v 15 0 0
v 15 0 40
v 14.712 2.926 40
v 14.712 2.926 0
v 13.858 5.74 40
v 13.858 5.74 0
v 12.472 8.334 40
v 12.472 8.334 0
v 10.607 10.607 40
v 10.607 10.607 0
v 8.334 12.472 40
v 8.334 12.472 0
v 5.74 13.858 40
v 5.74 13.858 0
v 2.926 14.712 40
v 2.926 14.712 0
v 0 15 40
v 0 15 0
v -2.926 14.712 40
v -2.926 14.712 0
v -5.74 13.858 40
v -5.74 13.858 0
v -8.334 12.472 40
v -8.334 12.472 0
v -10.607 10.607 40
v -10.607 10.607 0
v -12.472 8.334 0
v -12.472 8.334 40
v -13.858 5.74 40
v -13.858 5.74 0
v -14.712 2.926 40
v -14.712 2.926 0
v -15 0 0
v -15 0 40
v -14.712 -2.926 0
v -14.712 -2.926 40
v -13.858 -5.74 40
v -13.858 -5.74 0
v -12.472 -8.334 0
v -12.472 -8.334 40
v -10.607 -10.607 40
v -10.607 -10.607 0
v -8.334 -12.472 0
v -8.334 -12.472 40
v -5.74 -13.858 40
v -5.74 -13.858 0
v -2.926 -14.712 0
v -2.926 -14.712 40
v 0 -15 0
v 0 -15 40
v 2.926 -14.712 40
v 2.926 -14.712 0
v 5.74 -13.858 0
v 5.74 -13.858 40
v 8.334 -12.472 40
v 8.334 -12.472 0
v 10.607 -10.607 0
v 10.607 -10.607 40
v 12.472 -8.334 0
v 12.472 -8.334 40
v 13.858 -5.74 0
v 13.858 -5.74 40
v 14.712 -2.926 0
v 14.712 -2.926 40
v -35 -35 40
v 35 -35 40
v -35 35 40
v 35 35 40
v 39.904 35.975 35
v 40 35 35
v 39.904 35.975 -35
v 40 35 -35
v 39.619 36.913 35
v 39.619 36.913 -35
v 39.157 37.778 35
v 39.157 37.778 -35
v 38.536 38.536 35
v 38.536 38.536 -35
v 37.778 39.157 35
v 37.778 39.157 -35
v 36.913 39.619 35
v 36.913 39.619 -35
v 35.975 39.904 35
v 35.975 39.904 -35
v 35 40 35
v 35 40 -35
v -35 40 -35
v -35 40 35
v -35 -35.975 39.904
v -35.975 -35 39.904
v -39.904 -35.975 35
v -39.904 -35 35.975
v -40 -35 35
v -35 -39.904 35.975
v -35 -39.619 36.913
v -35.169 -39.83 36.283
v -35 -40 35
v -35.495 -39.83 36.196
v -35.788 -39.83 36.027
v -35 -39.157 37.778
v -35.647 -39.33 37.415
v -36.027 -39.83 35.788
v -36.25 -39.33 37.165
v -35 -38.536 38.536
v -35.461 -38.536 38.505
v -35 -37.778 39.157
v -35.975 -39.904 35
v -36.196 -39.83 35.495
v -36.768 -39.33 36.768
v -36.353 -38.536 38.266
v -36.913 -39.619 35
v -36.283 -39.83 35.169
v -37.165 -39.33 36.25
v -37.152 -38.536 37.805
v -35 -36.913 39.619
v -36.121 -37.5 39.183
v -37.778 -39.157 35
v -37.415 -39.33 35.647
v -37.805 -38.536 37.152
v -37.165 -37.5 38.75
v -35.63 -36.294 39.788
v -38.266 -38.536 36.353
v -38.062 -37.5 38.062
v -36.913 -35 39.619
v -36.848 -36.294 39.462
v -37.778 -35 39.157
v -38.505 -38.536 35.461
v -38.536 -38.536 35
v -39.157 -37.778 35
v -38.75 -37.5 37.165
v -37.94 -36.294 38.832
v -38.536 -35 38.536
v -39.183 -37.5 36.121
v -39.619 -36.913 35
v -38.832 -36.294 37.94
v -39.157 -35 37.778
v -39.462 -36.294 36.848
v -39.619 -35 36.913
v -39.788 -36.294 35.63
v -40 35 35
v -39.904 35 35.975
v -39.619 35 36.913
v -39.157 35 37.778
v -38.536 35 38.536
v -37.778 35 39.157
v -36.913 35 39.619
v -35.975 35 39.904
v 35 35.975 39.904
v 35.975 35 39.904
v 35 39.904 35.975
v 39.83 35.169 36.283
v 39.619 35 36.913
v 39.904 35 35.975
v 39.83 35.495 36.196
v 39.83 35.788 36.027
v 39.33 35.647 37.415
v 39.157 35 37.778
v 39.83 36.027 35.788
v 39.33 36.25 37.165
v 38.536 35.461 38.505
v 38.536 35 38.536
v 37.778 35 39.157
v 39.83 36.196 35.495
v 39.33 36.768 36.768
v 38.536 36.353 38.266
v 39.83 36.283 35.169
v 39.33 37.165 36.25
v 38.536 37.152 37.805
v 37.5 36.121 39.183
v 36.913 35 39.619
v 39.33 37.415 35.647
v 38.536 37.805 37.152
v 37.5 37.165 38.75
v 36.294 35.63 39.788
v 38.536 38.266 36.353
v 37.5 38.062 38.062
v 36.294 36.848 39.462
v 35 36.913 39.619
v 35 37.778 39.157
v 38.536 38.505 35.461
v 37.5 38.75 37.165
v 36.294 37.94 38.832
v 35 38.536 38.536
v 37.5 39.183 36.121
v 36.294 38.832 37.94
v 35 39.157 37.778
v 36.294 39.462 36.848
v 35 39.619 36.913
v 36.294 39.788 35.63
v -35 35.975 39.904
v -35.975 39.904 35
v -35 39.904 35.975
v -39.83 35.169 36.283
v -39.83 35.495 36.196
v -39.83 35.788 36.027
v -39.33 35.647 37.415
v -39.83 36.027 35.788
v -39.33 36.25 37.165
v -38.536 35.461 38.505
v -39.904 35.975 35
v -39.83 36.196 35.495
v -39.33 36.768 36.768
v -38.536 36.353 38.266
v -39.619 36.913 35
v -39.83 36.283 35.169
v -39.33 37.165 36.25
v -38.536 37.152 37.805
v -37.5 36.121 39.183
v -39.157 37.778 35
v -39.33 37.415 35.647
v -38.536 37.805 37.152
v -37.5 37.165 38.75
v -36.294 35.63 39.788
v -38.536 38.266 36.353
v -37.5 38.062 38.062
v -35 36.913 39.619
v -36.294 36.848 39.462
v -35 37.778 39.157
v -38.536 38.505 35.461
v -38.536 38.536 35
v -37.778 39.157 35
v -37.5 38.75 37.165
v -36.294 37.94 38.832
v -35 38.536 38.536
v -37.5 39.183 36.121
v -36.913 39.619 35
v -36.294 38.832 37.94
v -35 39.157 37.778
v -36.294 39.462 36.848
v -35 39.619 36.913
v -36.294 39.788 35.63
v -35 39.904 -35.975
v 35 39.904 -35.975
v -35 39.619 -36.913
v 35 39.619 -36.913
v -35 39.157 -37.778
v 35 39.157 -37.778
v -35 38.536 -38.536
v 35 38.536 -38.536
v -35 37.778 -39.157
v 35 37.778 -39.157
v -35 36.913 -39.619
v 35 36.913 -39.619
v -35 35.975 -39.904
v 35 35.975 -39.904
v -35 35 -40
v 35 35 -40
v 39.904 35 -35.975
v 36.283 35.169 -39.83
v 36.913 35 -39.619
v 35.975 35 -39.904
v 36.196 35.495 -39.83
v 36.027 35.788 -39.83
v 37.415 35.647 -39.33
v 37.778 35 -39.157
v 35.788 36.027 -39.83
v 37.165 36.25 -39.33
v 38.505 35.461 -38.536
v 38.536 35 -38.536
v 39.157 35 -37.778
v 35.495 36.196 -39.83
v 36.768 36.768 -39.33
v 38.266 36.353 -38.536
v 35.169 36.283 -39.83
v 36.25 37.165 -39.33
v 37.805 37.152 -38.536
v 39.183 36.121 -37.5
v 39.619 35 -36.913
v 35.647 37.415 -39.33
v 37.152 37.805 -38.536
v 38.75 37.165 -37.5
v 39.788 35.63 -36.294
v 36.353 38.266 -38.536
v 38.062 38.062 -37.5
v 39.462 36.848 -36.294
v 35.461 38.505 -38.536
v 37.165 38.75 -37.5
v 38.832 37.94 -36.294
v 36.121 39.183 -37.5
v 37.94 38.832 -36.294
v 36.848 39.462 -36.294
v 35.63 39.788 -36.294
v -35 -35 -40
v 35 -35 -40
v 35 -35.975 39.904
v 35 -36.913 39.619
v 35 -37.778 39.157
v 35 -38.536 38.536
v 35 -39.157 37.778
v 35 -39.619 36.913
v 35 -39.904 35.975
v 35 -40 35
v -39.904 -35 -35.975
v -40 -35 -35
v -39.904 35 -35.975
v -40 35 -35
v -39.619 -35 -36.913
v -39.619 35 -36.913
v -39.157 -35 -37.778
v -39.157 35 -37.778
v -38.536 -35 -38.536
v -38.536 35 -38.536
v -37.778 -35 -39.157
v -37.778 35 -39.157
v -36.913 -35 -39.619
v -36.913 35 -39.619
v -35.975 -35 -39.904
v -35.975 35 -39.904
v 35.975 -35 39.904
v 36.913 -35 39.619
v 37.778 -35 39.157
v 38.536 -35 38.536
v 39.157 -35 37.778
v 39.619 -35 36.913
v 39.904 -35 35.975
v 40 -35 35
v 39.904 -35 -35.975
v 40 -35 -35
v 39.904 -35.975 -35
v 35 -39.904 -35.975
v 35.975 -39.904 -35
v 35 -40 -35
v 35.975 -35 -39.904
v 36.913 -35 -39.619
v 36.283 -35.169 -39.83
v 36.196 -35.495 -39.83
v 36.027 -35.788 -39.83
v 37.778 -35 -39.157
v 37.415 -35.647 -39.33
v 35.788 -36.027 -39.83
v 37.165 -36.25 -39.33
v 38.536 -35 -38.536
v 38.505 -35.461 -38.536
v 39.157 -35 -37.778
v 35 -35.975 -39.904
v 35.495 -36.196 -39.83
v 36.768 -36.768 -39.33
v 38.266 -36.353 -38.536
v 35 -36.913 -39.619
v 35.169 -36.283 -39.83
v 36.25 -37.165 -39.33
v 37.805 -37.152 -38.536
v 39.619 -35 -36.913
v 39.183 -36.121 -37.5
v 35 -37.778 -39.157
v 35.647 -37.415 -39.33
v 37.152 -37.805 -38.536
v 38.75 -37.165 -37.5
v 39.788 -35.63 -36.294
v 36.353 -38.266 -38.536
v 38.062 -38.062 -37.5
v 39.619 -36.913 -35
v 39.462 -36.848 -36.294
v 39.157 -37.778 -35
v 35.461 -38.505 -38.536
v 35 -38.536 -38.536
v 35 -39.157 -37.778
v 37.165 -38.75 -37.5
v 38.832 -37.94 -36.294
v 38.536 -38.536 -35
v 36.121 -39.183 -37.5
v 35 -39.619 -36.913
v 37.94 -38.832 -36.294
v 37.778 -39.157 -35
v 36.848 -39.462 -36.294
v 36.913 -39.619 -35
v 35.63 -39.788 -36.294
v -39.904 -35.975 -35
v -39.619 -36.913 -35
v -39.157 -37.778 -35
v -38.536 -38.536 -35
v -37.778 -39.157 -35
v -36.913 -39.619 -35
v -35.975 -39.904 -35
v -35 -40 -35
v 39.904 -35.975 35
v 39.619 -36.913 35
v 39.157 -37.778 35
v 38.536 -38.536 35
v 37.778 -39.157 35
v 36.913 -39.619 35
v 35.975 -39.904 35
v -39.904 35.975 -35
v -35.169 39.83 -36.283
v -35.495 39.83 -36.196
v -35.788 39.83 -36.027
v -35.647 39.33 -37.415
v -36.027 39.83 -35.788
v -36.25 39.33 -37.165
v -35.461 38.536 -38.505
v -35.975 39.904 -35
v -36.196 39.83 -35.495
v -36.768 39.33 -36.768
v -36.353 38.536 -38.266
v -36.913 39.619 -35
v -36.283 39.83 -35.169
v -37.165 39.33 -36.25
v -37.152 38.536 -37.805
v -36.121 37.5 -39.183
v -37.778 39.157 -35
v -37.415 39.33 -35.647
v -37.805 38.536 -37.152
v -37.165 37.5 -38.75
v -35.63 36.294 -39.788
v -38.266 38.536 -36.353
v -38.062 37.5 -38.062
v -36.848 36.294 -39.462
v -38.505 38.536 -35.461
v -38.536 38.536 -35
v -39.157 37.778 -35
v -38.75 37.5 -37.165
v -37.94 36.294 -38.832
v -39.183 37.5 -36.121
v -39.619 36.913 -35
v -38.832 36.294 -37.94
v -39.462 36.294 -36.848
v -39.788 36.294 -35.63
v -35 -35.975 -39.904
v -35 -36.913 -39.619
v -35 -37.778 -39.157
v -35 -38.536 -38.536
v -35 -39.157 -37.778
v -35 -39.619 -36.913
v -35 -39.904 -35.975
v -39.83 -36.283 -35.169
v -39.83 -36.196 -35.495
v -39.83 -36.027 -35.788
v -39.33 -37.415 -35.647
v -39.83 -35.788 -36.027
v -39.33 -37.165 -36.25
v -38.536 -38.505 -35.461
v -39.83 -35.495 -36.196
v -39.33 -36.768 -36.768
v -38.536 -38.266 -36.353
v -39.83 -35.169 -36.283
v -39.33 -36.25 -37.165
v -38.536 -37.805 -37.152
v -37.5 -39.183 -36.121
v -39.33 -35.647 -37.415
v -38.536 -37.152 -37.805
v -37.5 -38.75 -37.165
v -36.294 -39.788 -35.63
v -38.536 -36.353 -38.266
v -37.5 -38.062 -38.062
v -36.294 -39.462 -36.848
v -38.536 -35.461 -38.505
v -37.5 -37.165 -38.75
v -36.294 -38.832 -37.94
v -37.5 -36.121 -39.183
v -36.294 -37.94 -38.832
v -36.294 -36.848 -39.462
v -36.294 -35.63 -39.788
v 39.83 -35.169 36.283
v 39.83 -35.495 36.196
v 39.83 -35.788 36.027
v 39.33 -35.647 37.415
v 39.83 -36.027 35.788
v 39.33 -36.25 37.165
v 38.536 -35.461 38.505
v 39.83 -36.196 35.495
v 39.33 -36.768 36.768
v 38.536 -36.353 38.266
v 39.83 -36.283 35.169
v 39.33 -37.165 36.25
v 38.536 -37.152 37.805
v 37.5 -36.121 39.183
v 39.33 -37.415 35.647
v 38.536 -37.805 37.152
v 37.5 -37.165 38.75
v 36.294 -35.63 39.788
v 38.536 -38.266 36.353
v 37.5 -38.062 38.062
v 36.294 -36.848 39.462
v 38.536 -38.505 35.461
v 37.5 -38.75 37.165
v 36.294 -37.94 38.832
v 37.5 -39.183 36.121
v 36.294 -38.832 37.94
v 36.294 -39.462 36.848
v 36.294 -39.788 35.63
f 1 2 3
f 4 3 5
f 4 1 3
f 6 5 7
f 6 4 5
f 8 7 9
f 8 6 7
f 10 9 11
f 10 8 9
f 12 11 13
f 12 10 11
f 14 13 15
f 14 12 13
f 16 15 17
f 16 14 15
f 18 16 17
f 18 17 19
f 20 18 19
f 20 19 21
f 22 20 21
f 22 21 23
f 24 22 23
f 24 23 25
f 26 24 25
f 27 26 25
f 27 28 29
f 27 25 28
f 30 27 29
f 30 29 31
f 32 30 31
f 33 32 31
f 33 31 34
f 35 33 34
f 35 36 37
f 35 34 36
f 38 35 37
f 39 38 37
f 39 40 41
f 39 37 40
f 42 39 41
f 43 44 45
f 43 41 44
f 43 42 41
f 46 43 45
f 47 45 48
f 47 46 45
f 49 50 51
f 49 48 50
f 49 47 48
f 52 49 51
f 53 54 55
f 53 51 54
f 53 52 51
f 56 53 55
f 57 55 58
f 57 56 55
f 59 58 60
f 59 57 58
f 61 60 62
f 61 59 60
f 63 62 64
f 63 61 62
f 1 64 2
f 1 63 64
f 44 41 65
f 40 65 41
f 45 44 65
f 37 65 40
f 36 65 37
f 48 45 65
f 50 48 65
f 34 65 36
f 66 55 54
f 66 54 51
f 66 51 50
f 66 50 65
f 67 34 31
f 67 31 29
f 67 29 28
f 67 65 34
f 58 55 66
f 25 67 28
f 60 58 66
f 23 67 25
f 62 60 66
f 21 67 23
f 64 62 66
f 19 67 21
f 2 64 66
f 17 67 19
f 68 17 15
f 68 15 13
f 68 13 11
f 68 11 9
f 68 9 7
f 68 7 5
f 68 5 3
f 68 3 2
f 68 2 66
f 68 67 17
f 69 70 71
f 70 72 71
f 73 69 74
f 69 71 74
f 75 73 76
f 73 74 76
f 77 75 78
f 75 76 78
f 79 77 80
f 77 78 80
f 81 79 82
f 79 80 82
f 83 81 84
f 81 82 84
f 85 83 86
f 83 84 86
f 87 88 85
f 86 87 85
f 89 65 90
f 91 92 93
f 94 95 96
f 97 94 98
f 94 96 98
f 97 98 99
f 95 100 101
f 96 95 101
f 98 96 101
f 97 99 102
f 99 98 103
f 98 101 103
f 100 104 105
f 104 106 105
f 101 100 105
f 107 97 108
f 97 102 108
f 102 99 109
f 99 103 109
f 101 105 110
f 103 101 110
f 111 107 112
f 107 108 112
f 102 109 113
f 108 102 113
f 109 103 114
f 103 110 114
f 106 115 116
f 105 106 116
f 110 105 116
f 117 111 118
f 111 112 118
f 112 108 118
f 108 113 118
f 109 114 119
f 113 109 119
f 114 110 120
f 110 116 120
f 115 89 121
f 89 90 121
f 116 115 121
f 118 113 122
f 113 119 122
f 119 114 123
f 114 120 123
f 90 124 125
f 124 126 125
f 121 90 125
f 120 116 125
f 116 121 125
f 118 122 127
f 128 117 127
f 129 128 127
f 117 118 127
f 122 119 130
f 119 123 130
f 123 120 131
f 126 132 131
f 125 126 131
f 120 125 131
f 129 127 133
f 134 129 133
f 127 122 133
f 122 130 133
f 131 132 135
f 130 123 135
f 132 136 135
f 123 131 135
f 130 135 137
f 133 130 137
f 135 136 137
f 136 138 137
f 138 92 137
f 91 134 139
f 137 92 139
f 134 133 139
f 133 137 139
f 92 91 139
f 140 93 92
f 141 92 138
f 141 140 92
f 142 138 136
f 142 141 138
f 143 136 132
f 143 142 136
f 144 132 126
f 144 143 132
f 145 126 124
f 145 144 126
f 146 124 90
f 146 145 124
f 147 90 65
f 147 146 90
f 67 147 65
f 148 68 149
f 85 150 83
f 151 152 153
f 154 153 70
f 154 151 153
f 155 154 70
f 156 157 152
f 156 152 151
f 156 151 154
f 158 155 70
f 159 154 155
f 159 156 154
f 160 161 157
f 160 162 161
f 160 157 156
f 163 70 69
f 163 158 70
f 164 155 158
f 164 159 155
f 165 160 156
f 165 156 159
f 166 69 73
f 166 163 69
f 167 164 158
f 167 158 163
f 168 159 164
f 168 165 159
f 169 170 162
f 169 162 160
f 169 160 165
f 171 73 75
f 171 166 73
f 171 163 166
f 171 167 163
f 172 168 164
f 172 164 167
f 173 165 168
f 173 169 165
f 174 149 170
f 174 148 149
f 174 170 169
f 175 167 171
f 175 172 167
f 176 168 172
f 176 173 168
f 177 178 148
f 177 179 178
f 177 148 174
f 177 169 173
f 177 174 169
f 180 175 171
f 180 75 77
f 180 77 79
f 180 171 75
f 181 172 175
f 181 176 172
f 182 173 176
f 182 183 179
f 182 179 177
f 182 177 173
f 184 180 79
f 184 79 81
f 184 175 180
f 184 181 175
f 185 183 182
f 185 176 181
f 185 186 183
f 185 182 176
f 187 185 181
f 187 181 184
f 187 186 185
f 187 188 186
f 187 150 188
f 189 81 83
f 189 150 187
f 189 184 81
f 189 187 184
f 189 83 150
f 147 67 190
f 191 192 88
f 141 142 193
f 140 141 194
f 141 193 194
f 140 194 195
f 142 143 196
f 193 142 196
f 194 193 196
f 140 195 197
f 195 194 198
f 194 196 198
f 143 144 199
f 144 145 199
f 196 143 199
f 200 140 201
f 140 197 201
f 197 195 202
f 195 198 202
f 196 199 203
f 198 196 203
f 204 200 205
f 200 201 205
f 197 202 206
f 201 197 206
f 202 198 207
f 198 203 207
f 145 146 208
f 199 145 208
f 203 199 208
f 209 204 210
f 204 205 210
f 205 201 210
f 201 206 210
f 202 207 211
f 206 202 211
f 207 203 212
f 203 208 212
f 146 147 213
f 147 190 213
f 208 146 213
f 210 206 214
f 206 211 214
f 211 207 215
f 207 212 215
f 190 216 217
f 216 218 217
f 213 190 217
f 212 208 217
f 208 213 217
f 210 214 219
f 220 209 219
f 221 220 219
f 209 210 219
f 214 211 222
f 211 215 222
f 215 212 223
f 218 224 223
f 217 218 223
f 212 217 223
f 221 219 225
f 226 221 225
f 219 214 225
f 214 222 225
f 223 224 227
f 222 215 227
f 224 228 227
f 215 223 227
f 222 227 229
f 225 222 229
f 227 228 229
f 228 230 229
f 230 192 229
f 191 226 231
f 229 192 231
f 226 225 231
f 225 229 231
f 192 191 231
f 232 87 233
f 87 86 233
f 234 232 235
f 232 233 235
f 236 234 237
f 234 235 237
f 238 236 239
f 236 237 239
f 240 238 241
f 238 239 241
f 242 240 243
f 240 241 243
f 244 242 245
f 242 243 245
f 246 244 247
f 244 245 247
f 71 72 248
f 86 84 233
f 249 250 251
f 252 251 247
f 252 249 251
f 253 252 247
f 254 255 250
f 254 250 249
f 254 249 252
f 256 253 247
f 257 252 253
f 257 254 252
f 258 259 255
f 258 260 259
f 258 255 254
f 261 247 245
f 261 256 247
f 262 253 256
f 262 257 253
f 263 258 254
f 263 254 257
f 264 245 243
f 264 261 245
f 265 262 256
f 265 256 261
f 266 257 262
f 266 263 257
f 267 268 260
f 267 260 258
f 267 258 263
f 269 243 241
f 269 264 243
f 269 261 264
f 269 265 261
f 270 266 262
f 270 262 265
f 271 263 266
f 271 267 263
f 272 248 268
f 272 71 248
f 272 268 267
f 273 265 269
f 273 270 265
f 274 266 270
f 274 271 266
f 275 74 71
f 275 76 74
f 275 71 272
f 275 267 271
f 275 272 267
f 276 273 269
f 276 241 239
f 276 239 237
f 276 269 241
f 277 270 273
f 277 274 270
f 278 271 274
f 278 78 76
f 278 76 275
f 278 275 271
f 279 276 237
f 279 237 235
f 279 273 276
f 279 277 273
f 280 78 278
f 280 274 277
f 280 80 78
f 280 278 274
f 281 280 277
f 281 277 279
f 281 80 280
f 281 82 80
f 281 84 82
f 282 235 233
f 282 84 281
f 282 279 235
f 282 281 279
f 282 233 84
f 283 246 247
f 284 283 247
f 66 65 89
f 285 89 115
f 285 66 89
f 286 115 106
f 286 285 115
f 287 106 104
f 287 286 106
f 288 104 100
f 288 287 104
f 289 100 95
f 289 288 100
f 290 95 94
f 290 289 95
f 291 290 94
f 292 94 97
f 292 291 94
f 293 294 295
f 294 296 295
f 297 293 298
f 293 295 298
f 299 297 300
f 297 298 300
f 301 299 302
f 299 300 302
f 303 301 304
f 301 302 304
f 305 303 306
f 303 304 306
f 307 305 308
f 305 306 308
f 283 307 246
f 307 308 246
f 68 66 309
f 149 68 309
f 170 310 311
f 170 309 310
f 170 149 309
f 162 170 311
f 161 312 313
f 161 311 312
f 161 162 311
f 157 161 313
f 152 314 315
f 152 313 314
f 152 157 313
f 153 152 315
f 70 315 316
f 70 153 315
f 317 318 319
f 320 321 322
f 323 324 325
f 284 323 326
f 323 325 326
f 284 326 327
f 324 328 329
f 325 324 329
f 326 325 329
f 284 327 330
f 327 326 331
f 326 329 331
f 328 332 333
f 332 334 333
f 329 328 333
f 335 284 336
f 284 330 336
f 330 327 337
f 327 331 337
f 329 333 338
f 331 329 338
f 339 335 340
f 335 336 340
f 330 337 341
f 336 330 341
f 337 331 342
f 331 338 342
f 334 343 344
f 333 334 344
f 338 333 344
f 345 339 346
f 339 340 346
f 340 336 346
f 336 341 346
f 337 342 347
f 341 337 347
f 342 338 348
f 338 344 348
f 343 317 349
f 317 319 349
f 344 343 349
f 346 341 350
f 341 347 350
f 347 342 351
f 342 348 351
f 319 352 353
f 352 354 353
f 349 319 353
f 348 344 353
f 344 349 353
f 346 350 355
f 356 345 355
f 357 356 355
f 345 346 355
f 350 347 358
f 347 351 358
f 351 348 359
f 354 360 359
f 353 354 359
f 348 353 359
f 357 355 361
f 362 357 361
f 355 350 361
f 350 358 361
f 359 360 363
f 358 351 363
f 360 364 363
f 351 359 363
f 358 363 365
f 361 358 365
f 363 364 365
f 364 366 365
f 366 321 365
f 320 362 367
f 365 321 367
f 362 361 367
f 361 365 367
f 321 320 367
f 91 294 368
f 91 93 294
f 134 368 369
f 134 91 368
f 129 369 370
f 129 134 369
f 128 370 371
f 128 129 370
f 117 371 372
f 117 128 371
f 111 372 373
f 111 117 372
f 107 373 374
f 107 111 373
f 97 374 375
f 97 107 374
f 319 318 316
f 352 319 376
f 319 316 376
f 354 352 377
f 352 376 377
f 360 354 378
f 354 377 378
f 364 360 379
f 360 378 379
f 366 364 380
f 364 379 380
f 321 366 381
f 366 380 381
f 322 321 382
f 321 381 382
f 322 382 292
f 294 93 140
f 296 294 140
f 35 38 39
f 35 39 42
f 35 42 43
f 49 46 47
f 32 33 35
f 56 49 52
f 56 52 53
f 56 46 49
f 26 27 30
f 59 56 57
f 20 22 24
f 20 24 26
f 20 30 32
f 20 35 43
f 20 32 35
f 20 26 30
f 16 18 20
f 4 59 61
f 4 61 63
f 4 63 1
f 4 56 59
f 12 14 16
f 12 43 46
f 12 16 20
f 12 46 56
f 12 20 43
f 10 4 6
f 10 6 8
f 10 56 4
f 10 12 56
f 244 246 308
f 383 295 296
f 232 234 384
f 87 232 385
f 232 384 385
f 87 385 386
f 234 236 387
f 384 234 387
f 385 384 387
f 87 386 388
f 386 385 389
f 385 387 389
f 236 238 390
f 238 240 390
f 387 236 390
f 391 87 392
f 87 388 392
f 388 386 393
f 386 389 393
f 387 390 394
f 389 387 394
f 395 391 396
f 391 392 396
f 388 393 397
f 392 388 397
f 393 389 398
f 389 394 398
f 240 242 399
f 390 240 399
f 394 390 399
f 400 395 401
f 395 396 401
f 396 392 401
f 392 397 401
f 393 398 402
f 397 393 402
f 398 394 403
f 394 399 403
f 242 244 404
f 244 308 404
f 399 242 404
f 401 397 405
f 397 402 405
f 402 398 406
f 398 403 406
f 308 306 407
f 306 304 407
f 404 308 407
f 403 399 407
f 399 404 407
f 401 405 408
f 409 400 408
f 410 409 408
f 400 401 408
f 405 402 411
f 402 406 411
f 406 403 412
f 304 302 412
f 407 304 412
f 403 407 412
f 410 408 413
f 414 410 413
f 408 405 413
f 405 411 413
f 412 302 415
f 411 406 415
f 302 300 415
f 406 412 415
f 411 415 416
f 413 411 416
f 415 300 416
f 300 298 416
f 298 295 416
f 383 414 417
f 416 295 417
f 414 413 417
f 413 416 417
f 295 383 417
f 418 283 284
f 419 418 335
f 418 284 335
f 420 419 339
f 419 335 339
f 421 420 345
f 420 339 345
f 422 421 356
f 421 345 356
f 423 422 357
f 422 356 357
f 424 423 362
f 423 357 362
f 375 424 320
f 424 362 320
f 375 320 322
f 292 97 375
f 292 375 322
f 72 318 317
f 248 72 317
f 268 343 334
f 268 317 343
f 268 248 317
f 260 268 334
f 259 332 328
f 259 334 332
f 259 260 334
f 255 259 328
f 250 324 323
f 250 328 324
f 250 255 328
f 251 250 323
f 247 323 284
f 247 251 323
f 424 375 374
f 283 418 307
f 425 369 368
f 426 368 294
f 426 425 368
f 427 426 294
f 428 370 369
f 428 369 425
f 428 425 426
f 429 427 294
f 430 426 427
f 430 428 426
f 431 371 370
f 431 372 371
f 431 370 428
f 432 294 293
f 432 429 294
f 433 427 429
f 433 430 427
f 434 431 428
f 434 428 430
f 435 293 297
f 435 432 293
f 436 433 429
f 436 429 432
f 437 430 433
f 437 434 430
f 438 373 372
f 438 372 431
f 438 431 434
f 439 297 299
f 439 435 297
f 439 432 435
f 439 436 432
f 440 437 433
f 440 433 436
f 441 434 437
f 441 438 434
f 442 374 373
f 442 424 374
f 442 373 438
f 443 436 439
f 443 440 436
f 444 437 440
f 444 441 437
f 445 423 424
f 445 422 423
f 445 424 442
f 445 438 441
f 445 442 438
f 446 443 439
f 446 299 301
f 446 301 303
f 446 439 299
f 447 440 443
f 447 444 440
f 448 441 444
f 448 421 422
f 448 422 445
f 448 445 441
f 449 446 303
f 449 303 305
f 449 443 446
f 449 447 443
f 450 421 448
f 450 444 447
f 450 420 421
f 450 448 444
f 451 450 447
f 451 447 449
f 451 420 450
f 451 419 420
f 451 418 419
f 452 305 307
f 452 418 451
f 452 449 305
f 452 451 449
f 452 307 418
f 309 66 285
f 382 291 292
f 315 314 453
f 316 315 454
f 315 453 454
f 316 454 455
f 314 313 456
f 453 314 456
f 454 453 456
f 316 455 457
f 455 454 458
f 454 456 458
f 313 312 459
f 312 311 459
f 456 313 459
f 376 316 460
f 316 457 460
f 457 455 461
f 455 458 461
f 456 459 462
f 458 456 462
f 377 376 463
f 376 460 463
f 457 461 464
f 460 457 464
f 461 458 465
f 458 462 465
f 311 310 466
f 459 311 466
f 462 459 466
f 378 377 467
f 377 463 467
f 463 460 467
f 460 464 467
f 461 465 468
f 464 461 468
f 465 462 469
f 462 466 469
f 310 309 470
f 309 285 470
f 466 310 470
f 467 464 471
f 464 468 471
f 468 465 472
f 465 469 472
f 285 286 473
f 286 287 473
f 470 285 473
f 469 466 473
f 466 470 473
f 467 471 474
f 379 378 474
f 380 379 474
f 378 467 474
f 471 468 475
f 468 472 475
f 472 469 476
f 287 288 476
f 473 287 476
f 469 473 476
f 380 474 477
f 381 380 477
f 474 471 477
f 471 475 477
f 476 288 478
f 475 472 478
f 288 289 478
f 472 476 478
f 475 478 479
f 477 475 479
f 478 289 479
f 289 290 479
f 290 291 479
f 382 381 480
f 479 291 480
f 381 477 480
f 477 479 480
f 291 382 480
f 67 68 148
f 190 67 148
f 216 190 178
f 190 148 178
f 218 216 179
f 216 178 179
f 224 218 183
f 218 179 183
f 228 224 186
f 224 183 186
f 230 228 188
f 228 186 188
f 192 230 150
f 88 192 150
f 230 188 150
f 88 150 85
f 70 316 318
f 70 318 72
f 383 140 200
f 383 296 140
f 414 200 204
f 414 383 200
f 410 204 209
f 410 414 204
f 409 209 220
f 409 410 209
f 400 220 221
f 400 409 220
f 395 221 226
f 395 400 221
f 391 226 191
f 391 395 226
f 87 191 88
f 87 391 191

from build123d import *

# Parameters (mm, degrees)
F0_W     = 80
F0_H     = 80
F1_DEPTH = 40
F2_R     = 5
F3_R     = 15
F4_DEPTH = 40.001


with BuildPart() as f1:
    # F0 (on Top) → F1 (new body, symmetric)
    with BuildSketch(Plane.XY):
        Rectangle(F0_W, F0_H)
    extrude(amount=F1_DEPTH, both=True)

    # F2
    f2_edges = [f1.edges().sort_by_distance(p)[0] for p in [
        (0, 40, 40),
        (-40, 0, 40),
        (0, -40, 40),
        (40, 0, 40),
        (40, -40, 0),
        (40, 40, 0),
        (40, 0, -40),
        (0, -40, -40),
        (-40, -40, 0),
        (-40, 0, -40),
        (0, 40, -40),
        (-40, 40, 0),
    ]]
    fillet(f2_edges, radius=F2_R)

    # F3 (on Top) → F4 (cut, through all)
    with BuildSketch(Plane.XY):
        Circle(F3_R)
    extrude(amount=F4_DEPTH, mode=Mode.SUBTRACT)


solid = f1.part
